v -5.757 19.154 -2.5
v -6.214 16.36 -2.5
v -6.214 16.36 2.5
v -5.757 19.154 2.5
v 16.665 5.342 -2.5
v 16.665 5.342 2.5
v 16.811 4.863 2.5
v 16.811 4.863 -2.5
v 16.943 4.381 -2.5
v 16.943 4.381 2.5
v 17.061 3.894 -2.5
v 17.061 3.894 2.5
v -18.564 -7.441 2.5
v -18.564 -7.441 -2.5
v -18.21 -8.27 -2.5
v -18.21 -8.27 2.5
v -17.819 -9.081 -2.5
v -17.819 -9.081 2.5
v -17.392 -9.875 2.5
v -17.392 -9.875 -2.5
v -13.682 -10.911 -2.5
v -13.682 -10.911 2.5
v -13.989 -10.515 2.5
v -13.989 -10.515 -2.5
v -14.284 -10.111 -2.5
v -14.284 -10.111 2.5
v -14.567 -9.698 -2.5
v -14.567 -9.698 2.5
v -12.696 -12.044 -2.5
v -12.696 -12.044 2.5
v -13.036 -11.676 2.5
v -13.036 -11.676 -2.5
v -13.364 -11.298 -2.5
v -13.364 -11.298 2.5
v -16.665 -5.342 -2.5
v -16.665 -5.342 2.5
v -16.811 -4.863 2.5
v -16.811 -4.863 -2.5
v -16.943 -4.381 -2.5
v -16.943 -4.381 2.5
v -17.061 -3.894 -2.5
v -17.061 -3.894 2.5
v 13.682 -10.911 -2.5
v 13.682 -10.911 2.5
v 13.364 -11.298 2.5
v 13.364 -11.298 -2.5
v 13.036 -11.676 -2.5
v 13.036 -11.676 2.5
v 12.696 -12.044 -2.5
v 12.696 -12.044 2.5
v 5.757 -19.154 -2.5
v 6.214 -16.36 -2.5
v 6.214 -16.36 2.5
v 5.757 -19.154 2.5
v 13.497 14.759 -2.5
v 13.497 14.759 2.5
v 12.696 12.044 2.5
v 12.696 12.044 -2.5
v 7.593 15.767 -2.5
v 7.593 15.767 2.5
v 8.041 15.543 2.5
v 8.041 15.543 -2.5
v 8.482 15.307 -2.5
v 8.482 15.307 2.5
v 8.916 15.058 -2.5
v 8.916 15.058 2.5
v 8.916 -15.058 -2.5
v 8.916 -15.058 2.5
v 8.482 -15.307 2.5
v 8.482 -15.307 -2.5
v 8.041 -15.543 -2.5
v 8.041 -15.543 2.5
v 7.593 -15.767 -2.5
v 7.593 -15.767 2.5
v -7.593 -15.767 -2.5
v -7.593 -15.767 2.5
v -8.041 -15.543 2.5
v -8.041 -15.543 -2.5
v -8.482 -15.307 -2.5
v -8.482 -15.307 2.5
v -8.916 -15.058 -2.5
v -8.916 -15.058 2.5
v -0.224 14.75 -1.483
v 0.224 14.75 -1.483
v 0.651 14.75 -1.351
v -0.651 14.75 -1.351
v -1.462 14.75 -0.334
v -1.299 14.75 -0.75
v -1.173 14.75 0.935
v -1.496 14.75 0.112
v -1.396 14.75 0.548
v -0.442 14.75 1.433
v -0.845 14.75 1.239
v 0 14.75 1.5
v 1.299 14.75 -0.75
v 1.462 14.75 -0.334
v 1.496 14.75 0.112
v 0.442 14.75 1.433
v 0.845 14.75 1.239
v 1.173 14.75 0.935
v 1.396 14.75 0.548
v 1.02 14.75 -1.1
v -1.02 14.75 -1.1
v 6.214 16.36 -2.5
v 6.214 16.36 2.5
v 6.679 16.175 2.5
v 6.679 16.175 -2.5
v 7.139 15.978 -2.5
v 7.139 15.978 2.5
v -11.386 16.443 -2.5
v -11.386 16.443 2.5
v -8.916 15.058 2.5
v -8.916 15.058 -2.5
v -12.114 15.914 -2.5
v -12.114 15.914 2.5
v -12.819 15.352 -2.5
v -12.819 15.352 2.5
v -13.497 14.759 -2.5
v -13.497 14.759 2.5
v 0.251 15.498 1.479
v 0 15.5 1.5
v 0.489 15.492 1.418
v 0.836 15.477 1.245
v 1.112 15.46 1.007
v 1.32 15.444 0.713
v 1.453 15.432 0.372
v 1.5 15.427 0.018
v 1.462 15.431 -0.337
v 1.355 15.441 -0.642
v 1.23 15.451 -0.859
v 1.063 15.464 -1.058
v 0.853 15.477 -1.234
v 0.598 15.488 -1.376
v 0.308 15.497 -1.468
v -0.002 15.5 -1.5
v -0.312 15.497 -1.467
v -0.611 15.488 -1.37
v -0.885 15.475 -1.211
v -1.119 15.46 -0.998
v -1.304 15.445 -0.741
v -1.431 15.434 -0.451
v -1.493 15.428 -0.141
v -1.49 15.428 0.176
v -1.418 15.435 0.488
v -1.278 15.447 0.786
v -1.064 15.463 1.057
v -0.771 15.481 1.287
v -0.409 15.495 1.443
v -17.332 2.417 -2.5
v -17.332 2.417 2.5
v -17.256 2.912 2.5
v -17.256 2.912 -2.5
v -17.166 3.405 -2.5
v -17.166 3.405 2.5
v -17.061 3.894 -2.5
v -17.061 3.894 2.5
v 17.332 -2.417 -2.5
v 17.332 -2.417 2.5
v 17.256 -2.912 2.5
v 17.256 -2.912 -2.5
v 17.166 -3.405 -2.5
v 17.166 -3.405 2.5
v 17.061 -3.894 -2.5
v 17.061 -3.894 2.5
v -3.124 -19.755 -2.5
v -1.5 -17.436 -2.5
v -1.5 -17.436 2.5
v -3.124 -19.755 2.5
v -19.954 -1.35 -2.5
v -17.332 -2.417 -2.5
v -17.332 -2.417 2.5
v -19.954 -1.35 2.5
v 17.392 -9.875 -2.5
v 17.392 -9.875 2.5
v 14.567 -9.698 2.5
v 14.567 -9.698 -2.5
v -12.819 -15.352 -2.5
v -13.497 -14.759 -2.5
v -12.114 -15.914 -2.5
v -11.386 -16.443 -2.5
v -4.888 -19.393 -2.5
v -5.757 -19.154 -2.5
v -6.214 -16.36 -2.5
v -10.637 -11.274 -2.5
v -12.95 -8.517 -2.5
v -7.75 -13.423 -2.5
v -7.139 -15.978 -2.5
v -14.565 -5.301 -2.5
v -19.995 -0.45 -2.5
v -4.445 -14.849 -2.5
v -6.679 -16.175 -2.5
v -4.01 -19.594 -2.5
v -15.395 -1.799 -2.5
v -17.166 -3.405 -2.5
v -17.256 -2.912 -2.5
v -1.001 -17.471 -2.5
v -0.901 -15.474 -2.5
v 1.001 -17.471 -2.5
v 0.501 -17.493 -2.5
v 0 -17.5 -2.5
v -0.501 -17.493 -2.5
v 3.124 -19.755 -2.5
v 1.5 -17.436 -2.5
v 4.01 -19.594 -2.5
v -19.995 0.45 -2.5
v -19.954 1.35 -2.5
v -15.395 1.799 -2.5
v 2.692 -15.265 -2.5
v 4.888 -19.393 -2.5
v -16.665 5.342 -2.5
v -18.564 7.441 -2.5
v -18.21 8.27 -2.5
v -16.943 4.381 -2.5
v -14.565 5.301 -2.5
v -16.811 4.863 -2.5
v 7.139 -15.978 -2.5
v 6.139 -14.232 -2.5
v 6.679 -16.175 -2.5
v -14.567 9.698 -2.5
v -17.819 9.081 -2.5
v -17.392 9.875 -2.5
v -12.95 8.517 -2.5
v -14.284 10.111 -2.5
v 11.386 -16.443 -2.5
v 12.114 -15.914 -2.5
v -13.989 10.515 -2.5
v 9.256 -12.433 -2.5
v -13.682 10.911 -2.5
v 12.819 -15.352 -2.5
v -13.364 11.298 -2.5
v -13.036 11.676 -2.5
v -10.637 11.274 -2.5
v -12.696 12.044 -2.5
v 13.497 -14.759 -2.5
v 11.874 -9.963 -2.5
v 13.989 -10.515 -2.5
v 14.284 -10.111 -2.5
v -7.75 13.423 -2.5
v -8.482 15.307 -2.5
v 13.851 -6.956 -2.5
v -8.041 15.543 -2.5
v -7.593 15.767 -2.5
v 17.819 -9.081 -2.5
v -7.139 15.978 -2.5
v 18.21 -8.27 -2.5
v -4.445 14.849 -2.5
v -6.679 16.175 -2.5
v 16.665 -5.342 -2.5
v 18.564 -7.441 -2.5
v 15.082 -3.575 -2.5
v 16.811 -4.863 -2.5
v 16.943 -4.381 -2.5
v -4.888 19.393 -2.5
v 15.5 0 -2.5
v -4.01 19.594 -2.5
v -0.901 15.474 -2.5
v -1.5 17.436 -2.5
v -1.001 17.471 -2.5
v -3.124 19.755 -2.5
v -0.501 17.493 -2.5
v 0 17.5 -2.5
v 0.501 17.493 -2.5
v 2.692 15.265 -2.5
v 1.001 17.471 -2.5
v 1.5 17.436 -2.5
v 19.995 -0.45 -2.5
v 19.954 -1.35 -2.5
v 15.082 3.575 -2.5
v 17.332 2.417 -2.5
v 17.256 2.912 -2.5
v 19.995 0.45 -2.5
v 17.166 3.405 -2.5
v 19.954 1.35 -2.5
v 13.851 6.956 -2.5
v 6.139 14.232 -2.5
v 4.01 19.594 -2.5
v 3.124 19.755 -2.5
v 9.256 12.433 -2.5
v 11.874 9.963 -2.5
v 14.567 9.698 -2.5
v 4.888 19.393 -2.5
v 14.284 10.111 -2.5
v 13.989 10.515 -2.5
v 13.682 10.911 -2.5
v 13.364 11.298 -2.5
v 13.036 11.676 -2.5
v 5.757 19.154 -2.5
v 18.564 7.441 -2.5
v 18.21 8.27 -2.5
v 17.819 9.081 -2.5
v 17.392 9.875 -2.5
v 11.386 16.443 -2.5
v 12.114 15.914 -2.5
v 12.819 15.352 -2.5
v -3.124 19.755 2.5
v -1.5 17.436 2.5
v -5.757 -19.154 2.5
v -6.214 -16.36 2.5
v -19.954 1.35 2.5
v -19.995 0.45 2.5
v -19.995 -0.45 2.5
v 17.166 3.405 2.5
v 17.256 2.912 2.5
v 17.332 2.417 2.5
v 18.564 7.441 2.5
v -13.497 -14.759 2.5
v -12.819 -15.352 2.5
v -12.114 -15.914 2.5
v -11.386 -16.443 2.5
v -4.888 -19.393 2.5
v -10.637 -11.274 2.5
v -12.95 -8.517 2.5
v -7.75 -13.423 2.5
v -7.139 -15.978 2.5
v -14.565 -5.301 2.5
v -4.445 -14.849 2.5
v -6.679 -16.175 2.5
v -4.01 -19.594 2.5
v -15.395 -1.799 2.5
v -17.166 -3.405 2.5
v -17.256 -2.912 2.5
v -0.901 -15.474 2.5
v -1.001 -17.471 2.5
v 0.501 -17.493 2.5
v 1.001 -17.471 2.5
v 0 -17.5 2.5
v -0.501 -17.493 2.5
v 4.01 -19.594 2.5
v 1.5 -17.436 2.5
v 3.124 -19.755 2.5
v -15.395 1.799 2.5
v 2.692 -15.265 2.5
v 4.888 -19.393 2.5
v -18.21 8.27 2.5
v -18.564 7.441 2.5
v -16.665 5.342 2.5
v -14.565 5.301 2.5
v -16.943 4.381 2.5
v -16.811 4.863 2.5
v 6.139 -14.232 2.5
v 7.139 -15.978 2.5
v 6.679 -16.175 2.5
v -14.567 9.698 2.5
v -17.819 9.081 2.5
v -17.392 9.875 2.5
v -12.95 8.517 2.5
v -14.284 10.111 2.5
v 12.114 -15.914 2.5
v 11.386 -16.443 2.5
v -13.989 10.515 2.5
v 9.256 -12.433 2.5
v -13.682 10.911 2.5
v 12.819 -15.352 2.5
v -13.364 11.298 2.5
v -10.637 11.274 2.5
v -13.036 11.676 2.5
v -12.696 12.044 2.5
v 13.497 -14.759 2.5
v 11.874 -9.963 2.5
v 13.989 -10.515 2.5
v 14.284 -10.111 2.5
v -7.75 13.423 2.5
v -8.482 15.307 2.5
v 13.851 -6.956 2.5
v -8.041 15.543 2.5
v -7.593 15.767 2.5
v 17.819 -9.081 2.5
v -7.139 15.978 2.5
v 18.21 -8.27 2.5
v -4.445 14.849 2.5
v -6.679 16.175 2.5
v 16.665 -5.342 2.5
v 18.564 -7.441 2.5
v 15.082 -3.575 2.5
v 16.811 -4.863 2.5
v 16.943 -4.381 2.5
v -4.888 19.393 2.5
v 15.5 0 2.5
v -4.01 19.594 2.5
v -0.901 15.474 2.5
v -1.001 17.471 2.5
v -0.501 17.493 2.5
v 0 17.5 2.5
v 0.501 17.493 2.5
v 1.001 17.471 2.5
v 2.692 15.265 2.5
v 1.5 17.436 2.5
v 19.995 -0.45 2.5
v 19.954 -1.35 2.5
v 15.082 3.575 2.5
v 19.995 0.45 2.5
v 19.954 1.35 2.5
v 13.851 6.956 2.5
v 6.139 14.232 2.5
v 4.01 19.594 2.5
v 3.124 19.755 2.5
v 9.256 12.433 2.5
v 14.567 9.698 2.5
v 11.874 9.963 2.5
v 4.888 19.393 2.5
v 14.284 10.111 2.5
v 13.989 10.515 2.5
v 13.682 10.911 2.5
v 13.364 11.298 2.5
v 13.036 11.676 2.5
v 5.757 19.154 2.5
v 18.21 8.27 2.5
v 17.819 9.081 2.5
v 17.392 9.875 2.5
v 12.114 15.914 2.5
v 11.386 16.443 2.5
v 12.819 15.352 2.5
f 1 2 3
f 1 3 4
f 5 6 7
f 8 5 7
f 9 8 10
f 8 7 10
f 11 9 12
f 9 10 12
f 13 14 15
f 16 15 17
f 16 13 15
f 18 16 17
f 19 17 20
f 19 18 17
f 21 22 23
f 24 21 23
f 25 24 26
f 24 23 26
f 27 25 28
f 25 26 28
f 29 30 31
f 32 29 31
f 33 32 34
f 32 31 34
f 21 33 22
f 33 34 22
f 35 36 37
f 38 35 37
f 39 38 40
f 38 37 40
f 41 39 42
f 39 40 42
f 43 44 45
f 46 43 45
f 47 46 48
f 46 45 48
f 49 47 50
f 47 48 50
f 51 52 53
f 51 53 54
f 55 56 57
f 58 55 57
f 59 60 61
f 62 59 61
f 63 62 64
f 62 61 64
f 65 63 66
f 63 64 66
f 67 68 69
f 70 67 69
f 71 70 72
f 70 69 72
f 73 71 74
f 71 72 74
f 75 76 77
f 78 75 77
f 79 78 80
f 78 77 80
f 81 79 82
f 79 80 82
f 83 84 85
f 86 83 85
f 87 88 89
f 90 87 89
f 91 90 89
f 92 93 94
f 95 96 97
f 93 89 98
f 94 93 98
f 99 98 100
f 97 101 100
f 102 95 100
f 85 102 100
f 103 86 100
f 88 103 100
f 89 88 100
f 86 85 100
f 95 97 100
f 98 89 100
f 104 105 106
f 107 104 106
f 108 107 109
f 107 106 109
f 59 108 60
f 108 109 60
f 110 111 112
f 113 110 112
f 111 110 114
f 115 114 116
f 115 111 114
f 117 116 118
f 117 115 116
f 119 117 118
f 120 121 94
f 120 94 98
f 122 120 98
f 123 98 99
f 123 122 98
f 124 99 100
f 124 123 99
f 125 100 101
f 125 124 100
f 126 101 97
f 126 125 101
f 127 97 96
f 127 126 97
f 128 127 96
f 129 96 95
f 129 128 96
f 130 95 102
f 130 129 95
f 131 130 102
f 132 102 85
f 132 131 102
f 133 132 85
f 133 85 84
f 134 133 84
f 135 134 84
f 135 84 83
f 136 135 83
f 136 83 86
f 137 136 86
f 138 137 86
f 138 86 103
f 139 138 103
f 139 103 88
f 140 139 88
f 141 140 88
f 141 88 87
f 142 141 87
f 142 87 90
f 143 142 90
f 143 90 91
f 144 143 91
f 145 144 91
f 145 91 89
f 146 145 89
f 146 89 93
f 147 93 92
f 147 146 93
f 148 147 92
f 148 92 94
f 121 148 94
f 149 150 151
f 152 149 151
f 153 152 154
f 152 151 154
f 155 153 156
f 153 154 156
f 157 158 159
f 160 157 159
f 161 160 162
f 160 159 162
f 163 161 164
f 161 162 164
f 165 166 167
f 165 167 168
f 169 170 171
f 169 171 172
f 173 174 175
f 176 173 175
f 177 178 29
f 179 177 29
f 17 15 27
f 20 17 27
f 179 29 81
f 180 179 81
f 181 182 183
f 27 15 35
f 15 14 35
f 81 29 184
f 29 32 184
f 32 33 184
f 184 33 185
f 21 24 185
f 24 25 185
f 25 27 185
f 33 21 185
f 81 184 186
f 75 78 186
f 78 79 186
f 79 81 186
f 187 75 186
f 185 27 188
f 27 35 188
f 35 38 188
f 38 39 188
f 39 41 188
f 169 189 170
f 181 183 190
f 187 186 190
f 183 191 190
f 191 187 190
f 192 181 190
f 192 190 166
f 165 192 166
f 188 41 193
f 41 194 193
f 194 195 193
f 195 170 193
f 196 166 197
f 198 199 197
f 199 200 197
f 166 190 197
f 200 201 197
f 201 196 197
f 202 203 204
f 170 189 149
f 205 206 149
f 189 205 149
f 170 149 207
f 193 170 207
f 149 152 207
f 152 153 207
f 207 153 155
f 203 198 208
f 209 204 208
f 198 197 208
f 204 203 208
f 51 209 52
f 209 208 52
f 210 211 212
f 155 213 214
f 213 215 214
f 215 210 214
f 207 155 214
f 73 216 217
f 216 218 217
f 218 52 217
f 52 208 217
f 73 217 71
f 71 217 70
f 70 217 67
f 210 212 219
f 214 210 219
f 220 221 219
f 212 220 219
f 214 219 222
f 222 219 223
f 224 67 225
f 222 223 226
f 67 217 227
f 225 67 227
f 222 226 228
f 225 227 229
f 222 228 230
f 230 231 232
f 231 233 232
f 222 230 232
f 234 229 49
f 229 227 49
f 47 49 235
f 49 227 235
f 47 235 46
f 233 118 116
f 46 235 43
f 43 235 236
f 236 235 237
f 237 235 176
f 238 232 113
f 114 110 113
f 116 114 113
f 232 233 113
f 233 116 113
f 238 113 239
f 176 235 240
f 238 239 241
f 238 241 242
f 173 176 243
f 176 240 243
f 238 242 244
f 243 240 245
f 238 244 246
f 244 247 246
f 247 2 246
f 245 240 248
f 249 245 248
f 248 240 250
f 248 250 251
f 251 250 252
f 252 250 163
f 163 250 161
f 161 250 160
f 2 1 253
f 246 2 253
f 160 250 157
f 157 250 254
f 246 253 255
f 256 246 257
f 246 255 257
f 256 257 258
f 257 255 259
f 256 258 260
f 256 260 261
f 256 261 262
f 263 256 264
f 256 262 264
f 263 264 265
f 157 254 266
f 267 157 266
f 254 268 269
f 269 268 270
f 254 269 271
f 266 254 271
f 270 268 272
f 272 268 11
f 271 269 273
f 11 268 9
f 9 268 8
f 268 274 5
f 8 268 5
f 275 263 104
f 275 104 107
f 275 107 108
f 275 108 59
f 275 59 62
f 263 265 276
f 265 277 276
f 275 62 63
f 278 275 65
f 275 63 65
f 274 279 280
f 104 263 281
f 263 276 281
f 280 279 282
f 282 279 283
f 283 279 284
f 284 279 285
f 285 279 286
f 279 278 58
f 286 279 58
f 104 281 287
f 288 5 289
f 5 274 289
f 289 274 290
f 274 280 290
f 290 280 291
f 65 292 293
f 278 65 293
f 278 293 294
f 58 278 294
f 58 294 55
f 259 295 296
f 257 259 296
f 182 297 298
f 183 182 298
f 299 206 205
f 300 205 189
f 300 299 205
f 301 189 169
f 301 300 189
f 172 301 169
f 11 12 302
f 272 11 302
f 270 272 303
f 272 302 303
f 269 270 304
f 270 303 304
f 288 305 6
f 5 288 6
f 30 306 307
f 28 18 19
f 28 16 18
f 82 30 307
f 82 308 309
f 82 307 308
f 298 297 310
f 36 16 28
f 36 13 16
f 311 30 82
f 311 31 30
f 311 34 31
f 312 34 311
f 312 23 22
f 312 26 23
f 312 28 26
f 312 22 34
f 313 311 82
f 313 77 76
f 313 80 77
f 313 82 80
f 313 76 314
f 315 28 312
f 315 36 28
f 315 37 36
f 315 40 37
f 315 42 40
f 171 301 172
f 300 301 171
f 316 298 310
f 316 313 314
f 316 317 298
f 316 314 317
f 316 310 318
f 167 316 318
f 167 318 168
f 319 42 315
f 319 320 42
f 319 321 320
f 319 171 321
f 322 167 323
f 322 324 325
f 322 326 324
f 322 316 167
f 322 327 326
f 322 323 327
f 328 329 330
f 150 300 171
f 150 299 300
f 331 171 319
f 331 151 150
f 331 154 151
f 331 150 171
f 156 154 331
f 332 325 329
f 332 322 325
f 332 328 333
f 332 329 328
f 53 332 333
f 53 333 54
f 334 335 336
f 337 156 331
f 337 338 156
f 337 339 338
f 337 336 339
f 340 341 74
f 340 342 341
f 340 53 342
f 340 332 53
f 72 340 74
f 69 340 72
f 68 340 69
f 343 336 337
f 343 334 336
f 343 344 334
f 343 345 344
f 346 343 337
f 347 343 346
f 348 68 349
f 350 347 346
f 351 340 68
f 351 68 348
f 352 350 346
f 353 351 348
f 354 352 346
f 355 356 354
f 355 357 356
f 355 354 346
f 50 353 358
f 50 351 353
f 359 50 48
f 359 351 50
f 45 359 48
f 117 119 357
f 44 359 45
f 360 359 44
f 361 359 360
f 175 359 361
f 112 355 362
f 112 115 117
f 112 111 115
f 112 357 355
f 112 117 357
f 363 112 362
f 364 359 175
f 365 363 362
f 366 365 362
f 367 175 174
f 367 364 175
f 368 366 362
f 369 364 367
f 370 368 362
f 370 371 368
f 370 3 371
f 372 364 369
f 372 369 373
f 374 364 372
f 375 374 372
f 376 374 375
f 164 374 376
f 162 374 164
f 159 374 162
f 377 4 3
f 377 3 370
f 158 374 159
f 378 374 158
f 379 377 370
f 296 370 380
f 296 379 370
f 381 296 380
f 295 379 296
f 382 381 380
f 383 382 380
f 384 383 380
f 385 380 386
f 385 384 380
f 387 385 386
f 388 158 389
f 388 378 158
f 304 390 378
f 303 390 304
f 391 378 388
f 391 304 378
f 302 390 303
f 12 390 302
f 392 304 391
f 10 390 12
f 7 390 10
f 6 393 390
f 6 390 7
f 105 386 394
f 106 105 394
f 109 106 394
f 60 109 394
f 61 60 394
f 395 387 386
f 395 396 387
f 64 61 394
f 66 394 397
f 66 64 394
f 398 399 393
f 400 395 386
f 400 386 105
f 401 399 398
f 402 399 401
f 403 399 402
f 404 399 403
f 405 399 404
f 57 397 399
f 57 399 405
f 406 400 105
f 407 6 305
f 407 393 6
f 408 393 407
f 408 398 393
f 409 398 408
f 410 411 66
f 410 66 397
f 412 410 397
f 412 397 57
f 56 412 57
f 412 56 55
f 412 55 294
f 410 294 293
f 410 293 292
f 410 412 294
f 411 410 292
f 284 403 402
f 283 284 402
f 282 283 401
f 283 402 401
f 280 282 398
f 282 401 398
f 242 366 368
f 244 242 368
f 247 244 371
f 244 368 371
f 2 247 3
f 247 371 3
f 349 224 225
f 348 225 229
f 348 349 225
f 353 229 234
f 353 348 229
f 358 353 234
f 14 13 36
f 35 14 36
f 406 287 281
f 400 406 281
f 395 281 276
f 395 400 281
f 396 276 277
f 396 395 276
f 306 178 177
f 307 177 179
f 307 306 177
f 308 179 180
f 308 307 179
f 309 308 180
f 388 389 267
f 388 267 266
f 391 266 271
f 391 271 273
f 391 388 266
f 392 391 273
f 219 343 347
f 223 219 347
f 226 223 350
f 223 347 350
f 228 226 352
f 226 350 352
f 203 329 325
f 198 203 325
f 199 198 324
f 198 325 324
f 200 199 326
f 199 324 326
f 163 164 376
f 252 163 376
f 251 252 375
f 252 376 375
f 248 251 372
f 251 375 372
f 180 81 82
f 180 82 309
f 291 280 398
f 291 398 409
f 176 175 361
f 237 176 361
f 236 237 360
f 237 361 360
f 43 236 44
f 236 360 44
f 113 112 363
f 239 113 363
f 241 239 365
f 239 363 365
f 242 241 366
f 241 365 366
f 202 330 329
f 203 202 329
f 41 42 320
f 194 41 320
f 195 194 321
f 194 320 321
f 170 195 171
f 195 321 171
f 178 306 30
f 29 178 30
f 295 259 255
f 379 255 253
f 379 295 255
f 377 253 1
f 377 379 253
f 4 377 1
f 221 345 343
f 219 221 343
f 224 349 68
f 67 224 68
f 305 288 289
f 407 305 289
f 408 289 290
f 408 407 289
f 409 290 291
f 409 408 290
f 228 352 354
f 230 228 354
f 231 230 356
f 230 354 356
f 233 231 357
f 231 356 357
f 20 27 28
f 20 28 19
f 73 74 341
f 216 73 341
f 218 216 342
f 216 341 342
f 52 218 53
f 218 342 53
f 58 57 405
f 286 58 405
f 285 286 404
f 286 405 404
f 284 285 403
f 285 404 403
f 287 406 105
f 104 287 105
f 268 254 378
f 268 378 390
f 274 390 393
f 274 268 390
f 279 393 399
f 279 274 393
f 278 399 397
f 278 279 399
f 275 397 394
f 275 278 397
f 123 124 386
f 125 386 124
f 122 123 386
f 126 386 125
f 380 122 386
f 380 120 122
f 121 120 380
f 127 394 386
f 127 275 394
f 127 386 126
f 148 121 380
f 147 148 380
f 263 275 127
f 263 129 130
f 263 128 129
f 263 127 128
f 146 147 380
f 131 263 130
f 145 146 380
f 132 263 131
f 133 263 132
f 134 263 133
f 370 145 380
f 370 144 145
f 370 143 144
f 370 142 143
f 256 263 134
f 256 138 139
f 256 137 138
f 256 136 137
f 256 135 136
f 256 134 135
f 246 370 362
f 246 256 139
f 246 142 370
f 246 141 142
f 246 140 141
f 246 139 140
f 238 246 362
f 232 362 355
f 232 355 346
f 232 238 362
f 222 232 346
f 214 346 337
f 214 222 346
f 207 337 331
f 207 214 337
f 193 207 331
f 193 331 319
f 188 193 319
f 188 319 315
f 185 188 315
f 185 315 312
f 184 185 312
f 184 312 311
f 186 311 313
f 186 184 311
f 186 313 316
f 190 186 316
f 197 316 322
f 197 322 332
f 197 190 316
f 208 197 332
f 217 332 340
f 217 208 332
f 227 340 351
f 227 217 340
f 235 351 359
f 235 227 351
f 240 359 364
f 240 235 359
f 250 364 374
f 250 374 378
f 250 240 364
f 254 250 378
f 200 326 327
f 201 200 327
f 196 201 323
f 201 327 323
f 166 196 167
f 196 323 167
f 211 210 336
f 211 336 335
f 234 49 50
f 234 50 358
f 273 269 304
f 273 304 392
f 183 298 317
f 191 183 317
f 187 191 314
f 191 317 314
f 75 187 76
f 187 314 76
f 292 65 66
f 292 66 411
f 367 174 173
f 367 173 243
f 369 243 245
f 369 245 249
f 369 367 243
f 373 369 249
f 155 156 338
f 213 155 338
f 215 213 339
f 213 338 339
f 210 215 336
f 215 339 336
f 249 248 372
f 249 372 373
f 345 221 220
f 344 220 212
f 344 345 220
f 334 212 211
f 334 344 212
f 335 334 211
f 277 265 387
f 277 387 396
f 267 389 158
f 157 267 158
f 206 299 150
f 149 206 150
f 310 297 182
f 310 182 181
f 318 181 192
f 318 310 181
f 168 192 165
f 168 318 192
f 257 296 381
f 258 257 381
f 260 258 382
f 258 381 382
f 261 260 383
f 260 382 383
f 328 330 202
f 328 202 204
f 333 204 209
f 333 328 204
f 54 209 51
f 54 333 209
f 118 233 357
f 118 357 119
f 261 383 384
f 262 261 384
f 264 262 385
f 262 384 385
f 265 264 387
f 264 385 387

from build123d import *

# Parameters (mm, degrees)
SKETCH1_R           = 20
SKETCH1_R_2         = 15.5
BOSS_EXTRUDE1_DEPTH = 2.5
CUT_EXTRUDE1_DEPTH  = 5
CIRPATTERN1_COUNT   = 14
SKETCH6_R           = 1.5
BOSS_EXTRUDE2_DEPTH = 0.75


with BuildPart() as part:
    # Sketch1 → Boss-Extrude1 (new, symmetric)
    with BuildSketch(Plane.XY):
        Circle(SKETCH1_R)
        Circle(SKETCH1_R_2, mode=Mode.SUBTRACT)
    extrude(amount=BOSS_EXTRUDE1_DEPTH, both=True)

    # Sketch2 → Cut-Extrude1 (cut)
    with BuildSketch(Plane.XY.offset(2.5)):
        with BuildLine():
            ThreePointArc((-1.5, 17.435595774), (-0.750690999, 17.48389153), (0, 17.5))
            Line((0, 17.5), (0, 20))
            ThreePointArc((0, 20), (-1.566688393, 19.938542762), (-3.123748353, 19.754548748))
            Line((-3.123748353, 19.754548748), (-1.5, 17.435595774))
        make_face()
        with BuildLine():
            Line((0, 20), (0, 17.5))
            ThreePointArc((0, 17.5), (0.750690999, 17.48389153), (1.5, 17.435595774))
            Line((1.5, 17.435595774), (3.123748353, 19.754548748))
            ThreePointArc((3.123748353, 19.754548748), (1.566688393, 19.938542762), (0, 20))
        make_face()
    cut_extrude1 = extrude(amount=-CUT_EXTRUDE1_DEPTH, mode=Mode.SUBTRACT)

    # CirPattern1: Cut-Extrude1 ×14 about axis
    cirpattern1_axis = Axis((0, 0, 0), (0, 0, 1))
    for i in range(1, CIRPATTERN1_COUNT):
        add(cut_extrude1.rotate(cirpattern1_axis, i * 360 / CIRPATTERN1_COUNT), mode=Mode.SUBTRACT)

    # Sketch6 → Boss-Extrude2 (add)
    with BuildSketch(Plane(origin=(0, 15.5, 0), x_dir=(1, 0, 0), z_dir=(0, 1, 0))):
        with Locations(Location((0, 0, 0), (0, 0, 270))):
            Circle(SKETCH6_R)
    extrude(amount=-BOSS_EXTRUDE2_DEPTH)


solid = part.part
